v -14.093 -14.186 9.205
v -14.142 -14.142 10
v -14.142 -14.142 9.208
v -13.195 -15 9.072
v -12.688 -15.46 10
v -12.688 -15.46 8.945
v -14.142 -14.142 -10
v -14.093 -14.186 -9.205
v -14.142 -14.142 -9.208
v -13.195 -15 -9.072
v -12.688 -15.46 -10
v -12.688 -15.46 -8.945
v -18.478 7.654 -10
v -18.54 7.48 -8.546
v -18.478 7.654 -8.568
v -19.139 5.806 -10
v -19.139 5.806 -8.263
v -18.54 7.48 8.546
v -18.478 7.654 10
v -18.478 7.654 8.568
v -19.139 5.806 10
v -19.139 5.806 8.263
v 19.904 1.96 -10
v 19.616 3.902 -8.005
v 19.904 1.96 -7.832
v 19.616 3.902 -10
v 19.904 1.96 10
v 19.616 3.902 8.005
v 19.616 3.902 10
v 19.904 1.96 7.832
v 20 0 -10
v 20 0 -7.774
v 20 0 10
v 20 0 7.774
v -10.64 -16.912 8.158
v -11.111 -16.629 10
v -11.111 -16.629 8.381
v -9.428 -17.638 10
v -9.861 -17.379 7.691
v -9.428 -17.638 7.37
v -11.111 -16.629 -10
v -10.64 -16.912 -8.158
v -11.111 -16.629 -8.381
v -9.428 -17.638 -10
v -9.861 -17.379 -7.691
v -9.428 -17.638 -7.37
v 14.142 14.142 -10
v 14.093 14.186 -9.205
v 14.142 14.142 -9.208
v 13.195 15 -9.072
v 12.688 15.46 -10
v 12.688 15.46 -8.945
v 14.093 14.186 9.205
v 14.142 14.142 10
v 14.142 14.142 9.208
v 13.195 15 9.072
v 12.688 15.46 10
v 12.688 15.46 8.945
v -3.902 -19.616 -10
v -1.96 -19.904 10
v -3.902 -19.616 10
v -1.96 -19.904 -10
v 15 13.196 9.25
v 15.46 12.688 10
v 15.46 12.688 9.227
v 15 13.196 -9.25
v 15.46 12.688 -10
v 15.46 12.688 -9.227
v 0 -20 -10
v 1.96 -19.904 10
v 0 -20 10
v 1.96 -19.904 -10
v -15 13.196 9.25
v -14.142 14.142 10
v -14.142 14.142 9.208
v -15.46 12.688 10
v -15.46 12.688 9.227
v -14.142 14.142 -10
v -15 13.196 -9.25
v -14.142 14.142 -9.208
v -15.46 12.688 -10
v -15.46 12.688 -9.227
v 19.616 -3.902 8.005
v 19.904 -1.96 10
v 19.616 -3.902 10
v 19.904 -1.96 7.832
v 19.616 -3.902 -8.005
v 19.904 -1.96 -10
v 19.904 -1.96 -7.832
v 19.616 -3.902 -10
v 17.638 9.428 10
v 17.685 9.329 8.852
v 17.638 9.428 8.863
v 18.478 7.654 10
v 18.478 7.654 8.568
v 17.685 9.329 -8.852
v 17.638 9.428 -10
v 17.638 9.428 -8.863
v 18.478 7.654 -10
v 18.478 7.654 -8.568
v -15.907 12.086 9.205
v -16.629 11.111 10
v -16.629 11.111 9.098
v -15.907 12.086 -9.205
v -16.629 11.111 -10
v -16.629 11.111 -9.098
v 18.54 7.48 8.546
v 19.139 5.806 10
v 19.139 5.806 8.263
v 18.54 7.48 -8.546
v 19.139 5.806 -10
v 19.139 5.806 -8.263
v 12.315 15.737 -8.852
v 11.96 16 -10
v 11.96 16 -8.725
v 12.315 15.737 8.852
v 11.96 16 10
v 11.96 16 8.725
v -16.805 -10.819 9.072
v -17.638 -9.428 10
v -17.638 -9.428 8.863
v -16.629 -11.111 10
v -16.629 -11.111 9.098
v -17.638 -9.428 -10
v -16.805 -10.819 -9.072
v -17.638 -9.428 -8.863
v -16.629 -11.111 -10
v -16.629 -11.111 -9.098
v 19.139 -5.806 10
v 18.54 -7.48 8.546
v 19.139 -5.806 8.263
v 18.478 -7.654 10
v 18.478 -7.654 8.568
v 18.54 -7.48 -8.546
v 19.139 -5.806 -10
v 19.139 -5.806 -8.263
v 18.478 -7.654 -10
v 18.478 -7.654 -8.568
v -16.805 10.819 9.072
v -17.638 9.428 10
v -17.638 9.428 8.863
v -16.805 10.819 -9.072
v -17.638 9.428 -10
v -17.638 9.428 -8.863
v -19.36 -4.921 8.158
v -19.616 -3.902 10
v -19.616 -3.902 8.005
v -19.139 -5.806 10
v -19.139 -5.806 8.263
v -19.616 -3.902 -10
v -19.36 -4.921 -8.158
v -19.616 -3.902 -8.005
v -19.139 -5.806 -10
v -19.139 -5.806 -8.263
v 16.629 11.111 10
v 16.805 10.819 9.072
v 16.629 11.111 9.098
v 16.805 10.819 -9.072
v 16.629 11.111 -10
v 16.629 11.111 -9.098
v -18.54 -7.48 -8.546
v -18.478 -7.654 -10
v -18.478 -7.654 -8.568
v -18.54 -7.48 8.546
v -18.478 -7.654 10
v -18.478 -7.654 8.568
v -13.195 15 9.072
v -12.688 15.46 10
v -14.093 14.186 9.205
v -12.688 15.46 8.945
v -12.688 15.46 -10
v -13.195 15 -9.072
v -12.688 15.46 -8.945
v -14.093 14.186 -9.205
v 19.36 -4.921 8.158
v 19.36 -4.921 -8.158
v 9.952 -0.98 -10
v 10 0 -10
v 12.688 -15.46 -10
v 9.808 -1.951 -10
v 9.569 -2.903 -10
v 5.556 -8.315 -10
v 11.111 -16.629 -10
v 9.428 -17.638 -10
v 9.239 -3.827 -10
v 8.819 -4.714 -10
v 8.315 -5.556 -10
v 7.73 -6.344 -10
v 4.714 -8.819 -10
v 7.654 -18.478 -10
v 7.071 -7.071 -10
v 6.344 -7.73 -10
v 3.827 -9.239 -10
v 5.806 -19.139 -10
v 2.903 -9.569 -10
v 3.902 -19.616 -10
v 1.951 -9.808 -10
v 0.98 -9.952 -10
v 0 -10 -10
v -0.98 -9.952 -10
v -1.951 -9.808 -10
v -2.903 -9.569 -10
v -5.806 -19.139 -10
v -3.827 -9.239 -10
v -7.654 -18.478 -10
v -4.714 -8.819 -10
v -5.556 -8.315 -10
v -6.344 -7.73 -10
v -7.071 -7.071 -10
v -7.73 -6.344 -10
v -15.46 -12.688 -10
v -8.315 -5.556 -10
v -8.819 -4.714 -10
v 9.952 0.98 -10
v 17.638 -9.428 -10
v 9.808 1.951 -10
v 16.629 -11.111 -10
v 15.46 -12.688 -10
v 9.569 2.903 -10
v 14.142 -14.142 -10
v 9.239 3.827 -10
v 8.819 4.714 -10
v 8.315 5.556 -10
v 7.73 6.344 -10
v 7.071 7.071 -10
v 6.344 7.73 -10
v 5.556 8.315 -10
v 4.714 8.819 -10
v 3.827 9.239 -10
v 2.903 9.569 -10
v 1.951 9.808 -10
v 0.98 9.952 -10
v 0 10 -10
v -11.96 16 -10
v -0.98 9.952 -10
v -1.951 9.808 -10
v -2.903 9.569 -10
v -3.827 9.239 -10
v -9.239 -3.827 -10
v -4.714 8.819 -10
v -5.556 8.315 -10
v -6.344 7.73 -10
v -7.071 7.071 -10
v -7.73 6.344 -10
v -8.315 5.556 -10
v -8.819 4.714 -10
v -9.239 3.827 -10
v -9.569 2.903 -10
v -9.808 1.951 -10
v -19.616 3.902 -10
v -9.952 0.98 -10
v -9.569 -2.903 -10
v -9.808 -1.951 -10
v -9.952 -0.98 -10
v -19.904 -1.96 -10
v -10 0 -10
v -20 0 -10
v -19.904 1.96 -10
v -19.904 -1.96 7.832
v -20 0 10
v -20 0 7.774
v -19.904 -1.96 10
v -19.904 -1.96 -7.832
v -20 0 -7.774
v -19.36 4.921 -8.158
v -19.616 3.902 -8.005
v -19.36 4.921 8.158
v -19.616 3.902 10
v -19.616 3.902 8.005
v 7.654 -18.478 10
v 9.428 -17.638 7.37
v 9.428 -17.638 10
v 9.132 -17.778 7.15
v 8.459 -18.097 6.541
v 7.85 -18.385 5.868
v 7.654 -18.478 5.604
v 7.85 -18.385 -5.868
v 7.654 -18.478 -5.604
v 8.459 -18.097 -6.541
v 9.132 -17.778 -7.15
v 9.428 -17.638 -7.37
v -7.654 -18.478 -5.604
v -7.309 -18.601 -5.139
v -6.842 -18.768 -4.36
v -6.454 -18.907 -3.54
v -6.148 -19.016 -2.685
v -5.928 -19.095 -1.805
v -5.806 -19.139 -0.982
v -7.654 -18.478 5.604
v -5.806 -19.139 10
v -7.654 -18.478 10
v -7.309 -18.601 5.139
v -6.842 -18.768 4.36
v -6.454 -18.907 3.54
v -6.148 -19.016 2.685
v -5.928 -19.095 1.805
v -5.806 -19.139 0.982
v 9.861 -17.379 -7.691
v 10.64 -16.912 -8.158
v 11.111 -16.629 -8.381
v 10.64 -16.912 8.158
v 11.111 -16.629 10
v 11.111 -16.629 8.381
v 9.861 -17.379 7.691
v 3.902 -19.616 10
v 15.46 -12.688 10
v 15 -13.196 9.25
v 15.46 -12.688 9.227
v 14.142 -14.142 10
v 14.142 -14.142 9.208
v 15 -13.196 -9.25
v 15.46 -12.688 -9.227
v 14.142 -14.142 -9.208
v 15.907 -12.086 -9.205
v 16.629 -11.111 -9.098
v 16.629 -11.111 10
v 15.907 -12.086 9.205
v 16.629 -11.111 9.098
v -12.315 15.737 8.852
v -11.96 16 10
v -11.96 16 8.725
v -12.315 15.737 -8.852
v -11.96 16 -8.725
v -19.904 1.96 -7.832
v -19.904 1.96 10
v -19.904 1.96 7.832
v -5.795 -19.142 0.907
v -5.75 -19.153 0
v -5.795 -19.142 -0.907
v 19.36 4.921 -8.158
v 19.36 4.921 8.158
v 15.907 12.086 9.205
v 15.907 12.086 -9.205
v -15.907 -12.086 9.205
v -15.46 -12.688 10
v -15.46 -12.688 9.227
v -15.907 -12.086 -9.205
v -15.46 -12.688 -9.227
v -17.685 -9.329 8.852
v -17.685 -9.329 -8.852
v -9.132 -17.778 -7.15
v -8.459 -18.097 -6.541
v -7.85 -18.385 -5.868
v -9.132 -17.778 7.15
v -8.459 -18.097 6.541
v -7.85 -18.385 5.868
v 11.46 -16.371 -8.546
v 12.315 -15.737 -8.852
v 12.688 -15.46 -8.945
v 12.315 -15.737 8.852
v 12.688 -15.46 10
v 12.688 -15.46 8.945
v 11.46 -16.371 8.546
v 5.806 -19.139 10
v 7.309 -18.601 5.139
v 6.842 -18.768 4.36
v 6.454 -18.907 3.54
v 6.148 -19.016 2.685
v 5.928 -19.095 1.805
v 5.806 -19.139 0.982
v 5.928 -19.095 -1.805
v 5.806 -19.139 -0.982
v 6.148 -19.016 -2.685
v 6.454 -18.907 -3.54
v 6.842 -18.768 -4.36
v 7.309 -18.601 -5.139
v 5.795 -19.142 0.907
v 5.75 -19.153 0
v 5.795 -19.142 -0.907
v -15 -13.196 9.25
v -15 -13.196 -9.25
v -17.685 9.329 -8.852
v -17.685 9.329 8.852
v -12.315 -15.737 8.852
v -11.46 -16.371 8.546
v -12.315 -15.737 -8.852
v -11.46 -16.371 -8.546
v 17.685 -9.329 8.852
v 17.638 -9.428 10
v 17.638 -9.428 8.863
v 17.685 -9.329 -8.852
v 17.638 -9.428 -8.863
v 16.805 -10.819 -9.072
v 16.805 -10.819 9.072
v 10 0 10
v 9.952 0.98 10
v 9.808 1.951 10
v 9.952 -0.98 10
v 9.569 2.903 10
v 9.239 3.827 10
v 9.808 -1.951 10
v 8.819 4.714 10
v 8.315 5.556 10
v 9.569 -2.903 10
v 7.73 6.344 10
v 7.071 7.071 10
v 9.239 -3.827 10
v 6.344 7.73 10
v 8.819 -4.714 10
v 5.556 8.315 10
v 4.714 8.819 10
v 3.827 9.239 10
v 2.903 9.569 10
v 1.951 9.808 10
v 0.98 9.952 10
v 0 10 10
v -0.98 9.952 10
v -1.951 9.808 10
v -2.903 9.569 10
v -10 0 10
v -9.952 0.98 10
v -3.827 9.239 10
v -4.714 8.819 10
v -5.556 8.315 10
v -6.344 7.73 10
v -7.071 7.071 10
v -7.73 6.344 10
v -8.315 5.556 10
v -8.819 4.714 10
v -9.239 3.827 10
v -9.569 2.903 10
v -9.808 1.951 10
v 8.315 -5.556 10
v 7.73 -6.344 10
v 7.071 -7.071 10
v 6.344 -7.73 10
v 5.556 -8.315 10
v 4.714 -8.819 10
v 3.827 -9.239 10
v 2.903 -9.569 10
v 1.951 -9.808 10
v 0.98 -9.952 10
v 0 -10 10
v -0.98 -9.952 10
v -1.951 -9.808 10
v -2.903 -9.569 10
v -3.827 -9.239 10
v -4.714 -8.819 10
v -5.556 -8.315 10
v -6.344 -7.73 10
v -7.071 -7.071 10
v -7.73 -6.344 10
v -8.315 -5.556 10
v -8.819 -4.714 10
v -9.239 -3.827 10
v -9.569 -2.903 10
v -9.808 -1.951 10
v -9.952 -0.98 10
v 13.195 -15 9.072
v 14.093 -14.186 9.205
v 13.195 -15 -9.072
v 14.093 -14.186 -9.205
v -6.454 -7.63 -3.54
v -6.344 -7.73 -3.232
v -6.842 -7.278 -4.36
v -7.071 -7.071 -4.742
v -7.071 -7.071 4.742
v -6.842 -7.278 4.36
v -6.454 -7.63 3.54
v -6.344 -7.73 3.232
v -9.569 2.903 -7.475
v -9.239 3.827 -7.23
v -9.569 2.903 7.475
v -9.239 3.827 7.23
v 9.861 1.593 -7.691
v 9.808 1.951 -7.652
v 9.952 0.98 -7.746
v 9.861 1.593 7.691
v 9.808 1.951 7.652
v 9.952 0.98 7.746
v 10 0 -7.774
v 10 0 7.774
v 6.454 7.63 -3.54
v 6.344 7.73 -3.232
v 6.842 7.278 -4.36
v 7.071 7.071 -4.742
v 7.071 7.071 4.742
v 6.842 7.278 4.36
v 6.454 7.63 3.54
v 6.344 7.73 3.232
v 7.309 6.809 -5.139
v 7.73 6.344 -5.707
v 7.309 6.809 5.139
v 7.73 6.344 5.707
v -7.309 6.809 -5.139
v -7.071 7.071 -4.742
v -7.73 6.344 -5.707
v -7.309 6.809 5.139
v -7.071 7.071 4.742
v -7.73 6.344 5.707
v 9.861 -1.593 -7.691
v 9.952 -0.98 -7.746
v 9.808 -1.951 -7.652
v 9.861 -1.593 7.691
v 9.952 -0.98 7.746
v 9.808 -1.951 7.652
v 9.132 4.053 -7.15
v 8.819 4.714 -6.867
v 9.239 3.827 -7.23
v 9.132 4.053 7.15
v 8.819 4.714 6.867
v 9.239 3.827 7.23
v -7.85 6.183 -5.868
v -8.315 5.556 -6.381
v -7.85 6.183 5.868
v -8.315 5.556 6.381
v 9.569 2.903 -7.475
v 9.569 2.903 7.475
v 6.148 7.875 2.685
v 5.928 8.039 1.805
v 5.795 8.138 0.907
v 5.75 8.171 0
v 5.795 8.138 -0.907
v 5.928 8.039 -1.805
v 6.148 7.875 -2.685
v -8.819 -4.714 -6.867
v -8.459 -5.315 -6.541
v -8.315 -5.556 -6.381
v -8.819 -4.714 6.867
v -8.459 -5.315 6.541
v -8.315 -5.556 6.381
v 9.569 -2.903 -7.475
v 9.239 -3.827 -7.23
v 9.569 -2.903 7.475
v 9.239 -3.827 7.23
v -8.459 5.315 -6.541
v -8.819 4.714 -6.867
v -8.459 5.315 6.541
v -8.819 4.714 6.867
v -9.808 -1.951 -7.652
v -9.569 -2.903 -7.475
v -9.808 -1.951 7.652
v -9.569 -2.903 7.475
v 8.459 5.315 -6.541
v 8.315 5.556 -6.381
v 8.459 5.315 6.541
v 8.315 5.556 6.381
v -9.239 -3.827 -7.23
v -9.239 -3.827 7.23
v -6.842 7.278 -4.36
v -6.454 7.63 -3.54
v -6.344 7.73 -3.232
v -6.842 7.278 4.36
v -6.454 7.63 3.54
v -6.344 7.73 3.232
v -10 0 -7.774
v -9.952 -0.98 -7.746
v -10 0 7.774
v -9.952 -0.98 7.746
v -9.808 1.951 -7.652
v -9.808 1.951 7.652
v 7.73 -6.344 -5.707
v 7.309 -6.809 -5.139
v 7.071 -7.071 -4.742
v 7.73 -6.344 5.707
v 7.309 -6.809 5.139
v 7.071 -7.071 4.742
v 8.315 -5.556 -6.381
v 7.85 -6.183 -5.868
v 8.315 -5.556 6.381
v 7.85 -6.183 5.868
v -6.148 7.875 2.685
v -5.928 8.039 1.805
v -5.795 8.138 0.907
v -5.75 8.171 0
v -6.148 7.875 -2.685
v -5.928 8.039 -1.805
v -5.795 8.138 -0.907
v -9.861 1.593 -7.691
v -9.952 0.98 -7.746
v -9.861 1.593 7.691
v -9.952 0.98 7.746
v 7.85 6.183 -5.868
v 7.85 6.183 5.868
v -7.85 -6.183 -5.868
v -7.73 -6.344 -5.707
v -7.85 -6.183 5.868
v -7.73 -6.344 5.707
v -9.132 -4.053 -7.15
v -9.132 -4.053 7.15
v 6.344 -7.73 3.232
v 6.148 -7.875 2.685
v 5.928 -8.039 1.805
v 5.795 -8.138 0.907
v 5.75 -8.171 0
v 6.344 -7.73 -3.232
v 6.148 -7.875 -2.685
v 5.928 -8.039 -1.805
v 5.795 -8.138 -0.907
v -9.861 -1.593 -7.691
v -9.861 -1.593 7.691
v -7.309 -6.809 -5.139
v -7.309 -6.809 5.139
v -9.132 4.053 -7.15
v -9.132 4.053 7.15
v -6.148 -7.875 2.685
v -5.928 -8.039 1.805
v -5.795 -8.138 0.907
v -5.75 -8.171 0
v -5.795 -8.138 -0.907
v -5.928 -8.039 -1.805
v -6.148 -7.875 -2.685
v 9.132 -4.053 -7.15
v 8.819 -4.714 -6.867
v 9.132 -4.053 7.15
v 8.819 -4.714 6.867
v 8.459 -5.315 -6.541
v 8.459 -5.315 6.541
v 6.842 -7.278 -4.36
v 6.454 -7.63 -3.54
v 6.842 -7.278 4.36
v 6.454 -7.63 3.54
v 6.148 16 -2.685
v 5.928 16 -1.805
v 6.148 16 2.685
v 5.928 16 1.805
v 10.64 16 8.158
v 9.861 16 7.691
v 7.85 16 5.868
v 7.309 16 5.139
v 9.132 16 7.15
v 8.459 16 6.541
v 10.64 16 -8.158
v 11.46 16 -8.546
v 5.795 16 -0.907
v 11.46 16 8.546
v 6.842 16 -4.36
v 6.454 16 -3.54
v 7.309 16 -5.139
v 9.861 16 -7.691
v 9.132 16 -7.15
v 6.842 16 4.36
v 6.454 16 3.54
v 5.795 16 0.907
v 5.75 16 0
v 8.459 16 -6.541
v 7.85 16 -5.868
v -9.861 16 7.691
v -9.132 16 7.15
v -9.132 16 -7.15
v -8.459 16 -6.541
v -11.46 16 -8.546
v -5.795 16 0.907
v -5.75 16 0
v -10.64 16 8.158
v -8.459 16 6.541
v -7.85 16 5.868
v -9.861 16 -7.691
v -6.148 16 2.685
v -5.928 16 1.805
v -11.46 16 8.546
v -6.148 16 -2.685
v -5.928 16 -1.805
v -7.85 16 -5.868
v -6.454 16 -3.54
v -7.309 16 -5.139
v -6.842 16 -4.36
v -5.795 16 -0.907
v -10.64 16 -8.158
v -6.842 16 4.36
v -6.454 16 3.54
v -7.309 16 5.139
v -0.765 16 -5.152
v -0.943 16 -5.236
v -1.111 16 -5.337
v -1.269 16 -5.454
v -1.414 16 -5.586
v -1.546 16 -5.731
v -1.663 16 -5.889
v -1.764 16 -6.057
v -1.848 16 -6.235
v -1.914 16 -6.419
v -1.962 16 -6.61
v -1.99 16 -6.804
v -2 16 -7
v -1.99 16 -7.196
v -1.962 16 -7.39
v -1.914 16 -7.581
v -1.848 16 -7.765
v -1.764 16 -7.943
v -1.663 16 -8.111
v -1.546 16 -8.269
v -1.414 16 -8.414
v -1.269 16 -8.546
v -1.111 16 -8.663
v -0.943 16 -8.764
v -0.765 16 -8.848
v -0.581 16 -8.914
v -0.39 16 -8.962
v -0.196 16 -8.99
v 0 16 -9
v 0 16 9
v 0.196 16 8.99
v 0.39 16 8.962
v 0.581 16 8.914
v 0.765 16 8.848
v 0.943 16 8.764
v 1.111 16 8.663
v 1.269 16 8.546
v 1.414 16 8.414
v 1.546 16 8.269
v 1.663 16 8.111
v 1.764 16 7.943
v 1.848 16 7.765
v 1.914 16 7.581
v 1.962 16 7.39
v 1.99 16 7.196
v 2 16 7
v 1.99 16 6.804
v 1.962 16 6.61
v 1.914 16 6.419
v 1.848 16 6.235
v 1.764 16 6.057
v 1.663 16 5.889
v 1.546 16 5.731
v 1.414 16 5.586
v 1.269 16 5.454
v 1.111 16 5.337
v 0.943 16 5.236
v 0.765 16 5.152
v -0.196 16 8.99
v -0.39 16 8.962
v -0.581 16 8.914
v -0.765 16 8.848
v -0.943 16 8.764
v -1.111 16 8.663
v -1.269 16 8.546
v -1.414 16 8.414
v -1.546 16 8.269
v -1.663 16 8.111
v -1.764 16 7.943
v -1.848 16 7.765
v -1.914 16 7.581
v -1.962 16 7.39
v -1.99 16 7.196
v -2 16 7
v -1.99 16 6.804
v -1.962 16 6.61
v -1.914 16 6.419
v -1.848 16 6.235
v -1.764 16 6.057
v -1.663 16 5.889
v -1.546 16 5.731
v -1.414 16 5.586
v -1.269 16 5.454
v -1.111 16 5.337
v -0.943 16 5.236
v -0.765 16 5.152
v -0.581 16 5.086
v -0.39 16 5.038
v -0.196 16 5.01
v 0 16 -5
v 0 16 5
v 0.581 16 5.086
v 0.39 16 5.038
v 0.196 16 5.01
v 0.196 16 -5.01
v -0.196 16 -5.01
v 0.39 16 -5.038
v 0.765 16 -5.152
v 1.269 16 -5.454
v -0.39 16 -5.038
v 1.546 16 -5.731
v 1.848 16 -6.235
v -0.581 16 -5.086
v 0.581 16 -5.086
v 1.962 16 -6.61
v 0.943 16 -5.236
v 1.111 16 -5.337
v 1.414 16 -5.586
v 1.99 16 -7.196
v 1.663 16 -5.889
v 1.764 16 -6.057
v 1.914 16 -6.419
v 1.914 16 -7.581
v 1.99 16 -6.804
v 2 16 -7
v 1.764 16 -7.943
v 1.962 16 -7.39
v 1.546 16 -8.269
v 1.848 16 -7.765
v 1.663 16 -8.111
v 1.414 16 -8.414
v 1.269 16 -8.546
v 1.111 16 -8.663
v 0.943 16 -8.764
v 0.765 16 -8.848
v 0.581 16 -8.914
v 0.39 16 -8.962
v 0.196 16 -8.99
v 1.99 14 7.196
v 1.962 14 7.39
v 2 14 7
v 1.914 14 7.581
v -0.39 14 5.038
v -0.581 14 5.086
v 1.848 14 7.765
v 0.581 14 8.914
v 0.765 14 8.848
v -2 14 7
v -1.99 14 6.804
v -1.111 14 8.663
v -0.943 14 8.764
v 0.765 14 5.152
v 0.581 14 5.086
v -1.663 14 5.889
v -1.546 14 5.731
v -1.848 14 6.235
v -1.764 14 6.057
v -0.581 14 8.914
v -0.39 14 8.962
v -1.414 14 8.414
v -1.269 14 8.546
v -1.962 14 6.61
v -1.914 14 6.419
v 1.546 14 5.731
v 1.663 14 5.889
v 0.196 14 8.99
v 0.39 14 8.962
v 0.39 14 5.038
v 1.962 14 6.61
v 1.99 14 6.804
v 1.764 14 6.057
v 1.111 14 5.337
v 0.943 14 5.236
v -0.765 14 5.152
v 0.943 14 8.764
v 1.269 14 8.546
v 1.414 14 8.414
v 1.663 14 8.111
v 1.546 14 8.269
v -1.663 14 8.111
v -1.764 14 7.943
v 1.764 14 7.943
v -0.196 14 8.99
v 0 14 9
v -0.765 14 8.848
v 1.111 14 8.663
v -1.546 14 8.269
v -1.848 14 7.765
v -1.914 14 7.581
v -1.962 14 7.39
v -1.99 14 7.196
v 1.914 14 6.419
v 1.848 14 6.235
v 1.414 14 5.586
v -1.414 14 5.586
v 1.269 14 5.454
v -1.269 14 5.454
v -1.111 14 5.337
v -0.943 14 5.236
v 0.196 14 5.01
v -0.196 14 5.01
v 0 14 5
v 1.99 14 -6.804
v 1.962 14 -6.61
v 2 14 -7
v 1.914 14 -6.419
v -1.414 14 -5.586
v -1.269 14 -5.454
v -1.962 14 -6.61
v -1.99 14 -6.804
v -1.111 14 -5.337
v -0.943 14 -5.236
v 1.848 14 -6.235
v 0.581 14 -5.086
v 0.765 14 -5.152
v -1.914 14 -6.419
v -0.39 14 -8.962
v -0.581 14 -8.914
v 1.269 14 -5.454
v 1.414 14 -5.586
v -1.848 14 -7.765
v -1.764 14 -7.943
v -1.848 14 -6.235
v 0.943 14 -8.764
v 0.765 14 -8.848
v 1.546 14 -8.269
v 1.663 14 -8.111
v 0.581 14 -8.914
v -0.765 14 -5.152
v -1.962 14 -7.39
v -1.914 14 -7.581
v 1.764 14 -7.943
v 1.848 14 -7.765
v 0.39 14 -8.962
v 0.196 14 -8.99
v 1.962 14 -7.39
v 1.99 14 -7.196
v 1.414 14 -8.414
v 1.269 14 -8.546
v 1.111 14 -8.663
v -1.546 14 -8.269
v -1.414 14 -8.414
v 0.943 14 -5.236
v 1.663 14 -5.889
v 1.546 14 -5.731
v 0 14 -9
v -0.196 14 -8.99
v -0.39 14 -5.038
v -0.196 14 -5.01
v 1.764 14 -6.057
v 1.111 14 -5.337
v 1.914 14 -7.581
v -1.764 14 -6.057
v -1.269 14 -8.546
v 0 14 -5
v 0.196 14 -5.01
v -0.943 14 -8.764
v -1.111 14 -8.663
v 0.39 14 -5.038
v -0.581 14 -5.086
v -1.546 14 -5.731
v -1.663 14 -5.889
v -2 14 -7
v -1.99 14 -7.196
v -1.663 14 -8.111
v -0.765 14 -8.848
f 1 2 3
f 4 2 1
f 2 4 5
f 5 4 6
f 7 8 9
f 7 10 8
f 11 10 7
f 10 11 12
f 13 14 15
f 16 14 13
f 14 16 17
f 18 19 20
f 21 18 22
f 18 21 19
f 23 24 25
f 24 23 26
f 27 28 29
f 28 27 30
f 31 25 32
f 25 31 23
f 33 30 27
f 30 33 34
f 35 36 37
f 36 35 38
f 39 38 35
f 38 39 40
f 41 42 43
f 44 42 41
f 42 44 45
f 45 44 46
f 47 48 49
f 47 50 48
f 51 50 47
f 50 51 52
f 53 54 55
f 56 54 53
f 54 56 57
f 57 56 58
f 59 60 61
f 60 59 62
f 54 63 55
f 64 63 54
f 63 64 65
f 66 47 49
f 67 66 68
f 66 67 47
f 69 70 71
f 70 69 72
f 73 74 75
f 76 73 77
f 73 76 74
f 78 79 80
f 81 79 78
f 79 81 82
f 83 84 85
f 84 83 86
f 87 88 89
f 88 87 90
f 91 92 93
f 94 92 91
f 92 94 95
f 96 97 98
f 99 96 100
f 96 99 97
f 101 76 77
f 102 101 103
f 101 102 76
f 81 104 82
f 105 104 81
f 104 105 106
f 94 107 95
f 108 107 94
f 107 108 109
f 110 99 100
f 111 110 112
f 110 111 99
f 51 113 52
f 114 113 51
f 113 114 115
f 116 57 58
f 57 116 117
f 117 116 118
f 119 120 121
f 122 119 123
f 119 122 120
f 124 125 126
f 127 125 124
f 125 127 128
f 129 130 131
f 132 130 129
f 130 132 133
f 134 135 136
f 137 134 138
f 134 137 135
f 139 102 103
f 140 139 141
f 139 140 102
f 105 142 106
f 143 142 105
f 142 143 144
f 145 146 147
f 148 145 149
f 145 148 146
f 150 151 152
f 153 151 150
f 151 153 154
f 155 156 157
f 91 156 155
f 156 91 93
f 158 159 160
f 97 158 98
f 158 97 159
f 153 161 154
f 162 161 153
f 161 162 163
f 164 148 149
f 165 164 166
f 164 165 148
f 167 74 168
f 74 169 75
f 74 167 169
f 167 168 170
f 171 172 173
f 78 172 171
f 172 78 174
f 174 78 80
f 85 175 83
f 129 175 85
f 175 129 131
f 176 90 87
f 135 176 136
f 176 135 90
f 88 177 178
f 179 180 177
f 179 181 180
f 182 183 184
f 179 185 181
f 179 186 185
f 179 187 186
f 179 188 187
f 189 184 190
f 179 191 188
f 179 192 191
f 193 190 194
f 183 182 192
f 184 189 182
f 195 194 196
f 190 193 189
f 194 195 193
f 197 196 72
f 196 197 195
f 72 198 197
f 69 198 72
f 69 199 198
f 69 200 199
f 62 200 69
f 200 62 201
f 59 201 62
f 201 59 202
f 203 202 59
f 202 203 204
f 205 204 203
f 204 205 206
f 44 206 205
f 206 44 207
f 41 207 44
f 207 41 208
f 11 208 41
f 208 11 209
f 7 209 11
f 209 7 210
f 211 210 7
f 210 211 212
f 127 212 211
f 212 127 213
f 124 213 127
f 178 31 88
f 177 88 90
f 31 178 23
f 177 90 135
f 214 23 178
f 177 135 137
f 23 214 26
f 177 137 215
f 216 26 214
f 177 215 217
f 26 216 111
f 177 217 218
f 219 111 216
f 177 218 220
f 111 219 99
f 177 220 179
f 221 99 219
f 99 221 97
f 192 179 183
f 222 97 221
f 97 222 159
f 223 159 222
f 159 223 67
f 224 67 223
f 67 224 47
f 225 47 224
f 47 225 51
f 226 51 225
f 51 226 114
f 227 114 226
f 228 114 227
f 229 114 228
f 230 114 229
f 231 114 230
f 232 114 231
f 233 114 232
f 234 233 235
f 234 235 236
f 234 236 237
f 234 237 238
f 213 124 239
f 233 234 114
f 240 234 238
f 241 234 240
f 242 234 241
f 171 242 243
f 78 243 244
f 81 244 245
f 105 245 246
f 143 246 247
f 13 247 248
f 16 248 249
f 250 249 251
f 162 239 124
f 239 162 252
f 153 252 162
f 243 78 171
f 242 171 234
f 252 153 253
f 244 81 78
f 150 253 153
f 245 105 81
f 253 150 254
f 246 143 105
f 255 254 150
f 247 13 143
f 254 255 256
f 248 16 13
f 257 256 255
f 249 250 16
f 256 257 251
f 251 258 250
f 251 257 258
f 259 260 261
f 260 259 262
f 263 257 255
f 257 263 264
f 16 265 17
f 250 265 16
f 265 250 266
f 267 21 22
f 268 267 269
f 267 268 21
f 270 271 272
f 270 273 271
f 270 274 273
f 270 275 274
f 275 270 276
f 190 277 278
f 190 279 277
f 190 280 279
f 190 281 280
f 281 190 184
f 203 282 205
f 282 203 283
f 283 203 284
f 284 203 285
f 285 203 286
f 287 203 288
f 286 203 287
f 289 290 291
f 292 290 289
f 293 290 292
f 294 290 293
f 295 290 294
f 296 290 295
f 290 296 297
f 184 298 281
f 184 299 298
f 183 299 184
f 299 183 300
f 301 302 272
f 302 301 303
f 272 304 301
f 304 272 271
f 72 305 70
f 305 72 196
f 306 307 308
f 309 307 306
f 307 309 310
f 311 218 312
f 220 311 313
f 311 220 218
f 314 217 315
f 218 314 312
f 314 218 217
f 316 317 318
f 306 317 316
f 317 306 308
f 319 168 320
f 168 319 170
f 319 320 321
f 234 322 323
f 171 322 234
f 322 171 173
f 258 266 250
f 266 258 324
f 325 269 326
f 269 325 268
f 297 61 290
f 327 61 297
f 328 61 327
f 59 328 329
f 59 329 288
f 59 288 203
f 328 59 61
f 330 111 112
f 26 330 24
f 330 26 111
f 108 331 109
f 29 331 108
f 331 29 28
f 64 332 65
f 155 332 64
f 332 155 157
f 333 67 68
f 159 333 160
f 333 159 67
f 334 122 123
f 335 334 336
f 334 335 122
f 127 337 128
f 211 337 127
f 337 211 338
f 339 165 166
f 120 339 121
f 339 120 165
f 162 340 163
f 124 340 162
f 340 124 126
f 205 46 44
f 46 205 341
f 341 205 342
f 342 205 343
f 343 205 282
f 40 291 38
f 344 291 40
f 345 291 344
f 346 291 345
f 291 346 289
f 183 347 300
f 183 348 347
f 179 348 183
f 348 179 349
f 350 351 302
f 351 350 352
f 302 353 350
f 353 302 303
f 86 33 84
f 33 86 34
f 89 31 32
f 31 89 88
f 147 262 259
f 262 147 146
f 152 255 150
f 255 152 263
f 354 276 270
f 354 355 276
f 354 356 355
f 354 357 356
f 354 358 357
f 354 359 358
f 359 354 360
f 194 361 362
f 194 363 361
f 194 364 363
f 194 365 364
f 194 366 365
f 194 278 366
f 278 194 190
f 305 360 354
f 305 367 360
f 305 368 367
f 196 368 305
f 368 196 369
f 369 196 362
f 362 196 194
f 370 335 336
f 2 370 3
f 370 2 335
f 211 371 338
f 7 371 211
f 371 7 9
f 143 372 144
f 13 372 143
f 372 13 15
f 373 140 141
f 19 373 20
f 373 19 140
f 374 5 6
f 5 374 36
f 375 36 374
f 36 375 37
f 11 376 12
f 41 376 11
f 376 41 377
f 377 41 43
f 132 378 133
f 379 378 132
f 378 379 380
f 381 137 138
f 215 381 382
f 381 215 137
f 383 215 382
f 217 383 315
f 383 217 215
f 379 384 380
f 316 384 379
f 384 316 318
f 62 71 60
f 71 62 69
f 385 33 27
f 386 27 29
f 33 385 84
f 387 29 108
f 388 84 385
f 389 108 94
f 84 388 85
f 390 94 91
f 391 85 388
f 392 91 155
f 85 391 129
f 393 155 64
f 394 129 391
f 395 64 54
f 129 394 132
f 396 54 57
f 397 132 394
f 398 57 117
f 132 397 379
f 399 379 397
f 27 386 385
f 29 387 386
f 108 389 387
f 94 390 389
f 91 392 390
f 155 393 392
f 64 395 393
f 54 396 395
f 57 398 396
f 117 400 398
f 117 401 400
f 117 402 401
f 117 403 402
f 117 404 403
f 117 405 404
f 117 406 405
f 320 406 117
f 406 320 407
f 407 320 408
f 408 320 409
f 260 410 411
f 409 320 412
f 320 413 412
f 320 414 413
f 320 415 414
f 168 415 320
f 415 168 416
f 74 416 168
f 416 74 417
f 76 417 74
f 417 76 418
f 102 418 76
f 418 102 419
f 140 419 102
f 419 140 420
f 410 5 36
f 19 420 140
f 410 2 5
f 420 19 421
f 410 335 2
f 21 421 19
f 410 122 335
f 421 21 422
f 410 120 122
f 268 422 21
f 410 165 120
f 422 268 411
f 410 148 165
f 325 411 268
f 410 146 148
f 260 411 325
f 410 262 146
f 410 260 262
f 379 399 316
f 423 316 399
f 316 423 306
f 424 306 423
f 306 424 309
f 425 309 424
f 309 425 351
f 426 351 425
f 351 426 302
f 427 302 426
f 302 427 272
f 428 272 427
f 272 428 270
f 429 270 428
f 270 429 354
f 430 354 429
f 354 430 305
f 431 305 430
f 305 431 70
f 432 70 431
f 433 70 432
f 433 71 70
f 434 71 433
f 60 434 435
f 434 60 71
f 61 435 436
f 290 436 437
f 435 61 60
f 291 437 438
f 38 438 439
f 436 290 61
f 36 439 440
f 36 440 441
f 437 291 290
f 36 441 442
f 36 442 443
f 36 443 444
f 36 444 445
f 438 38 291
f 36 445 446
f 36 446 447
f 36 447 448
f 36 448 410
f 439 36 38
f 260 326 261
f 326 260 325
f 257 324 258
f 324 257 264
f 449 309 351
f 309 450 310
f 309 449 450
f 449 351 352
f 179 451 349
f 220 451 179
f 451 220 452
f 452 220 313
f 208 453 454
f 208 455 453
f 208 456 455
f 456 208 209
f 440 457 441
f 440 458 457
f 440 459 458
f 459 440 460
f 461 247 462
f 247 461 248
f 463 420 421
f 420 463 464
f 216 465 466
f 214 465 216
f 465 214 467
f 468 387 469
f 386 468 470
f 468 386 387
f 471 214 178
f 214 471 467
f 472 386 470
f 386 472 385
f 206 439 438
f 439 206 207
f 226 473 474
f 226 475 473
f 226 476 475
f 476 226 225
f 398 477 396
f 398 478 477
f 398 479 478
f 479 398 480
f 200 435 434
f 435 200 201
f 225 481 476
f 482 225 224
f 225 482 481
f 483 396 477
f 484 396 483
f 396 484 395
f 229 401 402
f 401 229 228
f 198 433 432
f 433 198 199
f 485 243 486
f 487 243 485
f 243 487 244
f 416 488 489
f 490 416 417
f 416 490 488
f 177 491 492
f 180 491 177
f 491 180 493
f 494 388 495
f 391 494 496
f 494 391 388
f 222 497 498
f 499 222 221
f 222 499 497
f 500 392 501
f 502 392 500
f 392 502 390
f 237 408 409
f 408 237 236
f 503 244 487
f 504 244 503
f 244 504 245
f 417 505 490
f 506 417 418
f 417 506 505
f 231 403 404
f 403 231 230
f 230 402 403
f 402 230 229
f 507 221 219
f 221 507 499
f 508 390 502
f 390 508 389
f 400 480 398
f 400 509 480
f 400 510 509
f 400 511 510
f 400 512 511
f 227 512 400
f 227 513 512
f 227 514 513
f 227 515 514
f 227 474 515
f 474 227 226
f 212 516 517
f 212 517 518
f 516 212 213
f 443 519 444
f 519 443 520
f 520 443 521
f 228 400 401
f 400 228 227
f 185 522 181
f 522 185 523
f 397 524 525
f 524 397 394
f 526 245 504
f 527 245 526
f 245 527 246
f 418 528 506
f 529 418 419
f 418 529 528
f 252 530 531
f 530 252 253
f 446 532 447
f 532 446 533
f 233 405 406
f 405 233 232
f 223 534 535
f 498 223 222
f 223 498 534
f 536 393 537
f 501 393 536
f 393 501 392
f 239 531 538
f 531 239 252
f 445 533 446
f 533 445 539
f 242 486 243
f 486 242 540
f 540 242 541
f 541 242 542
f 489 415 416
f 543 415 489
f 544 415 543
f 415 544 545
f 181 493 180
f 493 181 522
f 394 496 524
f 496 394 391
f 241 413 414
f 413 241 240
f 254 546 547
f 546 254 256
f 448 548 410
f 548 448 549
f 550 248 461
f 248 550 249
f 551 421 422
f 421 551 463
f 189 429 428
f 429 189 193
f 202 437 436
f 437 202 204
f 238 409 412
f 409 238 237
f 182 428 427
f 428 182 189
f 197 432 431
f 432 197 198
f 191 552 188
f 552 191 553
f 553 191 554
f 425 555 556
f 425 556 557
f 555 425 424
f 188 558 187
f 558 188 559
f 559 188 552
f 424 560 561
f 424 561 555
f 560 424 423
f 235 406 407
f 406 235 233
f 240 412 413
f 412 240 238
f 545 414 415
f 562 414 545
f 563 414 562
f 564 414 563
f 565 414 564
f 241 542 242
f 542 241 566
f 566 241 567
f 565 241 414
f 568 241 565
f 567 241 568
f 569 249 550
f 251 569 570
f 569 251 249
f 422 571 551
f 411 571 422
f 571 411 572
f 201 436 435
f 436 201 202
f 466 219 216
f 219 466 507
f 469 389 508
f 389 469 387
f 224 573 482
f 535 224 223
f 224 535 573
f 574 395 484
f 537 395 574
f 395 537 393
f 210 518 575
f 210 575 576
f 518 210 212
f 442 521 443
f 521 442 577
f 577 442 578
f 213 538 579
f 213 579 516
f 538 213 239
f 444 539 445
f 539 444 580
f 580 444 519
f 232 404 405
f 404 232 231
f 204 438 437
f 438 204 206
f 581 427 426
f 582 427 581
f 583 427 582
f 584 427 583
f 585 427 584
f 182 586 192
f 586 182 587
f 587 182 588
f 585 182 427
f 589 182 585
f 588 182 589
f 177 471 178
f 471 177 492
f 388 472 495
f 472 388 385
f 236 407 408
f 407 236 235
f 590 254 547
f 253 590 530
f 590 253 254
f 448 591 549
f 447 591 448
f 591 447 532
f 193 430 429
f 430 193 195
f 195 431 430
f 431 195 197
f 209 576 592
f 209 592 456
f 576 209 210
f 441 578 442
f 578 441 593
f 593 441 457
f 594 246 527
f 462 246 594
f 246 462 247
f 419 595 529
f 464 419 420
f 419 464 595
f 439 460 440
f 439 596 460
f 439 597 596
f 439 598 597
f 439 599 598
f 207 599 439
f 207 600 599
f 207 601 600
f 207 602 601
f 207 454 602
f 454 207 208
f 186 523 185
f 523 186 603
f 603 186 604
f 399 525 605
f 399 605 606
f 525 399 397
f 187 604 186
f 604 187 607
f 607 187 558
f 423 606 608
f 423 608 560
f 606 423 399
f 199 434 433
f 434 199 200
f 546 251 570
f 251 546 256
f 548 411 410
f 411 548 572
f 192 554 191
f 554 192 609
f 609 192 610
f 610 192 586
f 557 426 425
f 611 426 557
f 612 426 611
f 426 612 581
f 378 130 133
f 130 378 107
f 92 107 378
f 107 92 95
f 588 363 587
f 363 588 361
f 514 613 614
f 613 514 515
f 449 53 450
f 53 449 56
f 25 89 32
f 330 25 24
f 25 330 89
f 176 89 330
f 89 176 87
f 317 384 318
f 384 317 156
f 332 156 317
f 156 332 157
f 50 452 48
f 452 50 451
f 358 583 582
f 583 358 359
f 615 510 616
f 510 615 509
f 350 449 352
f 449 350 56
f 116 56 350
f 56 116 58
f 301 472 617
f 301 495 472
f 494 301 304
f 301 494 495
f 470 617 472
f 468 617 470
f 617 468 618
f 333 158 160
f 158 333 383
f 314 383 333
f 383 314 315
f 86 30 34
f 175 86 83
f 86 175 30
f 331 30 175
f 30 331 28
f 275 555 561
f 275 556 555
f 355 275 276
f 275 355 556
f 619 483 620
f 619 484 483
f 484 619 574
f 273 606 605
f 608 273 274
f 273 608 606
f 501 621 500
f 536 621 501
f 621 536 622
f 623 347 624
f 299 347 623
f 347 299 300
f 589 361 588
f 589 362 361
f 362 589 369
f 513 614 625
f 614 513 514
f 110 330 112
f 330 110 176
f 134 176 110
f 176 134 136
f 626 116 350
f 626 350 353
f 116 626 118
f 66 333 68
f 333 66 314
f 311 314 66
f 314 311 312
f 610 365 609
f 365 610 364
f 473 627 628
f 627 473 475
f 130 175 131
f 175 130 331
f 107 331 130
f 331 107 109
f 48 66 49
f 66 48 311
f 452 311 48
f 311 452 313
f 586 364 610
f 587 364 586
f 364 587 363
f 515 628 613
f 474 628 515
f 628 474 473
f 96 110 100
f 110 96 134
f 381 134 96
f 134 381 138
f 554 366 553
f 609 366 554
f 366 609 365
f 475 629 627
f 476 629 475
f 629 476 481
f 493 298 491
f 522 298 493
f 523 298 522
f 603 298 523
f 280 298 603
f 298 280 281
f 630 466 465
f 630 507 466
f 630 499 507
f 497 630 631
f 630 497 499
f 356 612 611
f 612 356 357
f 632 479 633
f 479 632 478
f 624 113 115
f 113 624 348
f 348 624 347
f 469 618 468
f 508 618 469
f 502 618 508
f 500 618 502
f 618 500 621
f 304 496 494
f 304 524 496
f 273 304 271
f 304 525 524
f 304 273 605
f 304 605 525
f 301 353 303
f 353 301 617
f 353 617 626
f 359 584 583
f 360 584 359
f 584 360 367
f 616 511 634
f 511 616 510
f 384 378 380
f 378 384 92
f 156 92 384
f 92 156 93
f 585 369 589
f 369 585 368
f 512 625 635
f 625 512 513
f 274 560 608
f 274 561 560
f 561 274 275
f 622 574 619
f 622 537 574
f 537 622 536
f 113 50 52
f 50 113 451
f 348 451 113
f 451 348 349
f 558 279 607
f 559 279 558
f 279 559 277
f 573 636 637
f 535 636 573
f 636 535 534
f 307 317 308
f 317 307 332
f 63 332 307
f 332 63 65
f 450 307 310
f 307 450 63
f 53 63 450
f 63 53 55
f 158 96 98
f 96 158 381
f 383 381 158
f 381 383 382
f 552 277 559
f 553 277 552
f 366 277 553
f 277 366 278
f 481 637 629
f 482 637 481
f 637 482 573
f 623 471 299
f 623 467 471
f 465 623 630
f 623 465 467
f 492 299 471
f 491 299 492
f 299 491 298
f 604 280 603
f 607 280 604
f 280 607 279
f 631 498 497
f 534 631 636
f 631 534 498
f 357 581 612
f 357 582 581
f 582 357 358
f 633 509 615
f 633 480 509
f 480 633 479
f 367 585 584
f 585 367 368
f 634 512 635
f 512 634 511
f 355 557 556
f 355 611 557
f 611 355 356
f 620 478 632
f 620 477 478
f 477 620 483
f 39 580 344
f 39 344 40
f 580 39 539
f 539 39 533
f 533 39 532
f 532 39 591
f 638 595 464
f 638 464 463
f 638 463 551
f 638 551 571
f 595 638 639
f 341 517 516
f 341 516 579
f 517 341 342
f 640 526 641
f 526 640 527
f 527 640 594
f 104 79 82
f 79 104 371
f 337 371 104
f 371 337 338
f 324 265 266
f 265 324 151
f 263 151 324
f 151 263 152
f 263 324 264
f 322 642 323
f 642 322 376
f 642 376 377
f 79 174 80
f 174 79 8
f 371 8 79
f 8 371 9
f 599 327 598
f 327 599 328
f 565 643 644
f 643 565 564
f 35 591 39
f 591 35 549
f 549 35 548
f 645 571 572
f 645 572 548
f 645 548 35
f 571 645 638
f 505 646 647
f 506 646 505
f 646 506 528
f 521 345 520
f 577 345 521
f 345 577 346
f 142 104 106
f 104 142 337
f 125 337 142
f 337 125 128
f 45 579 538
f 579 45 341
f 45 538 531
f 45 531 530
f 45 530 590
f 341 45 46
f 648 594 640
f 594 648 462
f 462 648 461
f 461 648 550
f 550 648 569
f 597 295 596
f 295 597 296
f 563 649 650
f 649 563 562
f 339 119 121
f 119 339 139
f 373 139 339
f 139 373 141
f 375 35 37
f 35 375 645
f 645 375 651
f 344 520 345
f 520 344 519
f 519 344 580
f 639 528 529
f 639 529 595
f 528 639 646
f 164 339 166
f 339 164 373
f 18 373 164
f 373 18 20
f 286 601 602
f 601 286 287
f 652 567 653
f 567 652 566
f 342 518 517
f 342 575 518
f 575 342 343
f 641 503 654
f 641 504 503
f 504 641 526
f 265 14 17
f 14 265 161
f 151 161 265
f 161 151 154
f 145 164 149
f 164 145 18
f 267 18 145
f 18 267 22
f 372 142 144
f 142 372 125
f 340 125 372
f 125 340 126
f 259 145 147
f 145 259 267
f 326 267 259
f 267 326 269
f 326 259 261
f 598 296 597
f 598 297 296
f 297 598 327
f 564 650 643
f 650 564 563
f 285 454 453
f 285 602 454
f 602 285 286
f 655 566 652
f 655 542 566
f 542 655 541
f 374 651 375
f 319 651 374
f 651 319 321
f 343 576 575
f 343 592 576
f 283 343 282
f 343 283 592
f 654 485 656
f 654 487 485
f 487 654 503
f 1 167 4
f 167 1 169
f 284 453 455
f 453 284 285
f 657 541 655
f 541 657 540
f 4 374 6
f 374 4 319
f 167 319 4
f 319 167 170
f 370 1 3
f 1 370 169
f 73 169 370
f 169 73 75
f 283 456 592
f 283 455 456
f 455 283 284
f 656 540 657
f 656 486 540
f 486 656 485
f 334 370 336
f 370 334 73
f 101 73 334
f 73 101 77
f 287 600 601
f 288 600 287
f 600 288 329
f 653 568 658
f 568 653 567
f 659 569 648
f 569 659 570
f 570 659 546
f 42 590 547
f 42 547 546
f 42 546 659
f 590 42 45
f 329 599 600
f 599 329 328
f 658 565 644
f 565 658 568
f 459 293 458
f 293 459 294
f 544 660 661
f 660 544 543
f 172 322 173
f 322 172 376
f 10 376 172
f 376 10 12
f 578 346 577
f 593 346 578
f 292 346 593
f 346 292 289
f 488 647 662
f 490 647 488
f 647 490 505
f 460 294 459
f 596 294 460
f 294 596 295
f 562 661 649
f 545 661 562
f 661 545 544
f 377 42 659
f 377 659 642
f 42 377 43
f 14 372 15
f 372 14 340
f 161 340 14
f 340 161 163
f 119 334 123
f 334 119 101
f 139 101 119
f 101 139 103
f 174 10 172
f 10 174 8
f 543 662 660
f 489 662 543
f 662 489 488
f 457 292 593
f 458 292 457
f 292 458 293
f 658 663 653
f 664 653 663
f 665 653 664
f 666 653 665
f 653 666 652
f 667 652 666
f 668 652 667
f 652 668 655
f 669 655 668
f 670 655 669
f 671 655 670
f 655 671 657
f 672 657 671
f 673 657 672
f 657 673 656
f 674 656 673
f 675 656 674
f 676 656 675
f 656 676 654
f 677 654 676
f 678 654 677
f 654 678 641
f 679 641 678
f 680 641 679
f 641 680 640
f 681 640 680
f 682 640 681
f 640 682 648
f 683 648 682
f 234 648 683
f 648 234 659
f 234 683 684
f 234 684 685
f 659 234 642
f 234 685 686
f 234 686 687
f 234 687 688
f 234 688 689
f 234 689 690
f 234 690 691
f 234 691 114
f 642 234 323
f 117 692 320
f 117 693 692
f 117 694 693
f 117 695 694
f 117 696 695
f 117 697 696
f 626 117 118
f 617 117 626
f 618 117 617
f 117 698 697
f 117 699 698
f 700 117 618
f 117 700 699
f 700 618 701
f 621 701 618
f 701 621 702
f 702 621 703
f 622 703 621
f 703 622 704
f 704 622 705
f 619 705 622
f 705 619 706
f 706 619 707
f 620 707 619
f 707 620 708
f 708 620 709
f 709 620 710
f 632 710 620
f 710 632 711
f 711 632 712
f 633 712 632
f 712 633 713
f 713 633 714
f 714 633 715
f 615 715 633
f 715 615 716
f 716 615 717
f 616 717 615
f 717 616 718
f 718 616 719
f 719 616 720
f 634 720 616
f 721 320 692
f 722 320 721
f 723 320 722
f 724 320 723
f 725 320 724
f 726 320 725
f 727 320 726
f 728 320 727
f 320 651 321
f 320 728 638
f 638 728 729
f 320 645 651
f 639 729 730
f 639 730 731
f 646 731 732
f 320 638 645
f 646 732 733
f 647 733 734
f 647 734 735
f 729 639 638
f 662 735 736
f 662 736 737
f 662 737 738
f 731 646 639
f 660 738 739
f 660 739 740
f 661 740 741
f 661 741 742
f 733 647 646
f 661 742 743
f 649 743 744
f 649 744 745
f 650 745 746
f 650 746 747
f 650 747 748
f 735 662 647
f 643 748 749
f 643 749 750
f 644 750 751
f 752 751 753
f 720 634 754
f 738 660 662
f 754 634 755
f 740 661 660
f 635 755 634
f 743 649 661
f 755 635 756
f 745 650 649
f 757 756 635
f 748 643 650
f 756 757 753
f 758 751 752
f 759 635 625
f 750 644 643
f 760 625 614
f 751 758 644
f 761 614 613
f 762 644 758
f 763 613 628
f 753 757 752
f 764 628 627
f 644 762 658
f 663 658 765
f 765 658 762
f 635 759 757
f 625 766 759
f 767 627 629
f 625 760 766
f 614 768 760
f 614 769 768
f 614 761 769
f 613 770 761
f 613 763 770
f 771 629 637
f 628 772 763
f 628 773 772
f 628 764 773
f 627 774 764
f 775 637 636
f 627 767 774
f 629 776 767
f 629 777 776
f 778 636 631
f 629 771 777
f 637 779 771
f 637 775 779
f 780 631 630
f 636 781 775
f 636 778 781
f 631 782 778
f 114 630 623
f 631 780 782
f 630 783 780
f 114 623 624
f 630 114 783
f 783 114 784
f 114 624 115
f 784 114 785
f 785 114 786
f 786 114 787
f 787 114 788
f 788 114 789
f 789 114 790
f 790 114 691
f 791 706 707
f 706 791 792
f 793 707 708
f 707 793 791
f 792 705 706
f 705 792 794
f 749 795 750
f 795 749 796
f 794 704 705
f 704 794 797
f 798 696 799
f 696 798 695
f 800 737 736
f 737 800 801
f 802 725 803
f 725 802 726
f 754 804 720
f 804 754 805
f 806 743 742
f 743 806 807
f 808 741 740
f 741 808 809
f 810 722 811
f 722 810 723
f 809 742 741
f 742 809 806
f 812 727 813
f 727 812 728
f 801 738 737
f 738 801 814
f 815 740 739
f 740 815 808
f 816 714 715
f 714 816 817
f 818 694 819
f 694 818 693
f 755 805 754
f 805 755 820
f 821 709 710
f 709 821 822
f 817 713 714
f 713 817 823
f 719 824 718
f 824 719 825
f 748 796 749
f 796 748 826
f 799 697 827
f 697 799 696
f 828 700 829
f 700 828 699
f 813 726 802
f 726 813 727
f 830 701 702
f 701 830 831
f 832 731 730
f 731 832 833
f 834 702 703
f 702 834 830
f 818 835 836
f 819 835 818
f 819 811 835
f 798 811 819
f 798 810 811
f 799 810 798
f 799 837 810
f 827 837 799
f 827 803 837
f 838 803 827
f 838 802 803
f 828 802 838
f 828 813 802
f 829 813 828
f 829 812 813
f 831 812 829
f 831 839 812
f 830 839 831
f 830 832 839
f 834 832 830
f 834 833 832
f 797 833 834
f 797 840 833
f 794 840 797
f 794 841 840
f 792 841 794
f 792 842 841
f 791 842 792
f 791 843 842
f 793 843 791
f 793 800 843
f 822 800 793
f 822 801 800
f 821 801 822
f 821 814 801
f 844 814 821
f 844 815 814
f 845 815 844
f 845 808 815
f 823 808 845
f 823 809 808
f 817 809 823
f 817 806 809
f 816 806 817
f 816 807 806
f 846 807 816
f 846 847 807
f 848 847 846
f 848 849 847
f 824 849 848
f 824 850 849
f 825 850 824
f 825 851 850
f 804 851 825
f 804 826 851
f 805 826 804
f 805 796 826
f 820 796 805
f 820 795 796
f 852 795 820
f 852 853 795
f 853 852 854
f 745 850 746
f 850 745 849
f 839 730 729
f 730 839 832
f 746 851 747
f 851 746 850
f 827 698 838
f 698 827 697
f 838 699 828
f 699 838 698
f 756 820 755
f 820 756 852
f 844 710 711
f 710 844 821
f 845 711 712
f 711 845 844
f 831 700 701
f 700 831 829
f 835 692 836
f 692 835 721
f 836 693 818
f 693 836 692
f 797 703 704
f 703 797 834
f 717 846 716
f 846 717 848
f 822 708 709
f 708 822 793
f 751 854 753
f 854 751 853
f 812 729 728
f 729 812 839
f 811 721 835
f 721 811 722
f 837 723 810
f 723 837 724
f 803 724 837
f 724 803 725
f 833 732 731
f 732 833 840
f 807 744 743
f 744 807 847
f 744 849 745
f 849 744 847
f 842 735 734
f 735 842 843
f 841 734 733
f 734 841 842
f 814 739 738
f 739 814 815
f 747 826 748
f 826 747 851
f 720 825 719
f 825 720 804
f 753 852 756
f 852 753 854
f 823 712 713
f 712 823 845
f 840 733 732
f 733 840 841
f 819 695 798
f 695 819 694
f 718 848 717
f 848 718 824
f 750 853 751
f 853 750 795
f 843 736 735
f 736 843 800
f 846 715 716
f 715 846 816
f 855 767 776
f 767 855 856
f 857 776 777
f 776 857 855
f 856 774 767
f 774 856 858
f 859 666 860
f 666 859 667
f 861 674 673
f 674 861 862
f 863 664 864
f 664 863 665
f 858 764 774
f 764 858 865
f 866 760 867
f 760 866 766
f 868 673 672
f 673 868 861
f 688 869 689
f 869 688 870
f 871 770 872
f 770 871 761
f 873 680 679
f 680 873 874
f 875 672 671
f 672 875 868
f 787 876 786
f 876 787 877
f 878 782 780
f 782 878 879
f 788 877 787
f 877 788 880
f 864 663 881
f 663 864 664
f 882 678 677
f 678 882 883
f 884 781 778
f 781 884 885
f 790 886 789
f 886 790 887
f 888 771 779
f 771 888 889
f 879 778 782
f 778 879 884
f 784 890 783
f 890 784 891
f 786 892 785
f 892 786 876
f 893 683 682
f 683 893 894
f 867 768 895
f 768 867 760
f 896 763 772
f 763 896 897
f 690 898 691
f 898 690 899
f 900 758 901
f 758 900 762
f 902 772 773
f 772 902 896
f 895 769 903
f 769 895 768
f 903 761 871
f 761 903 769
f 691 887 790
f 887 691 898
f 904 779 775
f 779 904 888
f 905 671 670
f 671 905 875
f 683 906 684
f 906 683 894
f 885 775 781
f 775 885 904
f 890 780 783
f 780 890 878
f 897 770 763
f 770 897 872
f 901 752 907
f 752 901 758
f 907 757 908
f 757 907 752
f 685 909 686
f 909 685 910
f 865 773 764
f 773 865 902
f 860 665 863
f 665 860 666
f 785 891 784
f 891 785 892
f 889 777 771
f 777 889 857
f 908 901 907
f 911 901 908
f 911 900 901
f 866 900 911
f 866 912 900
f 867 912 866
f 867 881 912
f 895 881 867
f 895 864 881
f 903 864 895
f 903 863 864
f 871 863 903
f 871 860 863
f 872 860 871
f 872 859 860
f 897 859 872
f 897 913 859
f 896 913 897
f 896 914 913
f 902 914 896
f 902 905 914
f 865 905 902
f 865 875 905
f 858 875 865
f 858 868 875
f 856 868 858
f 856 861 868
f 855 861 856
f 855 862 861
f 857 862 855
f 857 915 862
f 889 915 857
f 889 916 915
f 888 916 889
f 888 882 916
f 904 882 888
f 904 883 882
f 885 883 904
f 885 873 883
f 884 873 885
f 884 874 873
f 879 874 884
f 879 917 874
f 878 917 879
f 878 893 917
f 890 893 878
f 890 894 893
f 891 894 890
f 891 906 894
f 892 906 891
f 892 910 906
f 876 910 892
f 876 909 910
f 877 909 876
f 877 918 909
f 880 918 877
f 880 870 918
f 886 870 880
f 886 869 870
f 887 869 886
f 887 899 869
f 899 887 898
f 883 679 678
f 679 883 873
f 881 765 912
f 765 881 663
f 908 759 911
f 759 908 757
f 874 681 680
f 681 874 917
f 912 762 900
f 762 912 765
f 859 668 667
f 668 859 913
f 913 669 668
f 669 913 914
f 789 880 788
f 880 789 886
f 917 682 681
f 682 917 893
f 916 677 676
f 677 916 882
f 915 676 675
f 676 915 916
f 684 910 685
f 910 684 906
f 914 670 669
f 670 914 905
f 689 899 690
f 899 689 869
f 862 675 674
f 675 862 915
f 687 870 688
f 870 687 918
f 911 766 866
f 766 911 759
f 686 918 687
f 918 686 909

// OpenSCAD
// COBRA Vertebra - T2 V8
// Height: 20.0mm, OD: 40.0mm

$fn = 64;

difference() {
    // Outer cylinder
    cylinder(h=20.0, d=40.0, center=true);
    
    // Inner channel
    cylinder(h=22.0, d=20.0, center=true);

    // Battery cavity 1
    rotate([0, 0, 0])
    translate([15.0, 0, 0])
    rotate([90, 0, 0])
    cylinder(h=74.0, d=18.5, center=true);

    // Battery cavity 2
    rotate([0, 0, 180])
    translate([15.0, 0, 0])
    rotate([90, 0, 0])
    cylinder(h=74.0, d=18.5, center=true);

    // Solar panel cavity
    translate([0, 18.0, 0])
    cube([50, 4, 30], center=true);

    // Pivot holes
    translate([0, 20.0, 7.0])
    rotate([90, 0, 0])
    cylinder(h=12.0, d=4, center=true);
    
    translate([0, 20.0, -7.0])
    rotate([90, 0, 0])
    cylinder(h=12.0, d=4, center=true);
}
